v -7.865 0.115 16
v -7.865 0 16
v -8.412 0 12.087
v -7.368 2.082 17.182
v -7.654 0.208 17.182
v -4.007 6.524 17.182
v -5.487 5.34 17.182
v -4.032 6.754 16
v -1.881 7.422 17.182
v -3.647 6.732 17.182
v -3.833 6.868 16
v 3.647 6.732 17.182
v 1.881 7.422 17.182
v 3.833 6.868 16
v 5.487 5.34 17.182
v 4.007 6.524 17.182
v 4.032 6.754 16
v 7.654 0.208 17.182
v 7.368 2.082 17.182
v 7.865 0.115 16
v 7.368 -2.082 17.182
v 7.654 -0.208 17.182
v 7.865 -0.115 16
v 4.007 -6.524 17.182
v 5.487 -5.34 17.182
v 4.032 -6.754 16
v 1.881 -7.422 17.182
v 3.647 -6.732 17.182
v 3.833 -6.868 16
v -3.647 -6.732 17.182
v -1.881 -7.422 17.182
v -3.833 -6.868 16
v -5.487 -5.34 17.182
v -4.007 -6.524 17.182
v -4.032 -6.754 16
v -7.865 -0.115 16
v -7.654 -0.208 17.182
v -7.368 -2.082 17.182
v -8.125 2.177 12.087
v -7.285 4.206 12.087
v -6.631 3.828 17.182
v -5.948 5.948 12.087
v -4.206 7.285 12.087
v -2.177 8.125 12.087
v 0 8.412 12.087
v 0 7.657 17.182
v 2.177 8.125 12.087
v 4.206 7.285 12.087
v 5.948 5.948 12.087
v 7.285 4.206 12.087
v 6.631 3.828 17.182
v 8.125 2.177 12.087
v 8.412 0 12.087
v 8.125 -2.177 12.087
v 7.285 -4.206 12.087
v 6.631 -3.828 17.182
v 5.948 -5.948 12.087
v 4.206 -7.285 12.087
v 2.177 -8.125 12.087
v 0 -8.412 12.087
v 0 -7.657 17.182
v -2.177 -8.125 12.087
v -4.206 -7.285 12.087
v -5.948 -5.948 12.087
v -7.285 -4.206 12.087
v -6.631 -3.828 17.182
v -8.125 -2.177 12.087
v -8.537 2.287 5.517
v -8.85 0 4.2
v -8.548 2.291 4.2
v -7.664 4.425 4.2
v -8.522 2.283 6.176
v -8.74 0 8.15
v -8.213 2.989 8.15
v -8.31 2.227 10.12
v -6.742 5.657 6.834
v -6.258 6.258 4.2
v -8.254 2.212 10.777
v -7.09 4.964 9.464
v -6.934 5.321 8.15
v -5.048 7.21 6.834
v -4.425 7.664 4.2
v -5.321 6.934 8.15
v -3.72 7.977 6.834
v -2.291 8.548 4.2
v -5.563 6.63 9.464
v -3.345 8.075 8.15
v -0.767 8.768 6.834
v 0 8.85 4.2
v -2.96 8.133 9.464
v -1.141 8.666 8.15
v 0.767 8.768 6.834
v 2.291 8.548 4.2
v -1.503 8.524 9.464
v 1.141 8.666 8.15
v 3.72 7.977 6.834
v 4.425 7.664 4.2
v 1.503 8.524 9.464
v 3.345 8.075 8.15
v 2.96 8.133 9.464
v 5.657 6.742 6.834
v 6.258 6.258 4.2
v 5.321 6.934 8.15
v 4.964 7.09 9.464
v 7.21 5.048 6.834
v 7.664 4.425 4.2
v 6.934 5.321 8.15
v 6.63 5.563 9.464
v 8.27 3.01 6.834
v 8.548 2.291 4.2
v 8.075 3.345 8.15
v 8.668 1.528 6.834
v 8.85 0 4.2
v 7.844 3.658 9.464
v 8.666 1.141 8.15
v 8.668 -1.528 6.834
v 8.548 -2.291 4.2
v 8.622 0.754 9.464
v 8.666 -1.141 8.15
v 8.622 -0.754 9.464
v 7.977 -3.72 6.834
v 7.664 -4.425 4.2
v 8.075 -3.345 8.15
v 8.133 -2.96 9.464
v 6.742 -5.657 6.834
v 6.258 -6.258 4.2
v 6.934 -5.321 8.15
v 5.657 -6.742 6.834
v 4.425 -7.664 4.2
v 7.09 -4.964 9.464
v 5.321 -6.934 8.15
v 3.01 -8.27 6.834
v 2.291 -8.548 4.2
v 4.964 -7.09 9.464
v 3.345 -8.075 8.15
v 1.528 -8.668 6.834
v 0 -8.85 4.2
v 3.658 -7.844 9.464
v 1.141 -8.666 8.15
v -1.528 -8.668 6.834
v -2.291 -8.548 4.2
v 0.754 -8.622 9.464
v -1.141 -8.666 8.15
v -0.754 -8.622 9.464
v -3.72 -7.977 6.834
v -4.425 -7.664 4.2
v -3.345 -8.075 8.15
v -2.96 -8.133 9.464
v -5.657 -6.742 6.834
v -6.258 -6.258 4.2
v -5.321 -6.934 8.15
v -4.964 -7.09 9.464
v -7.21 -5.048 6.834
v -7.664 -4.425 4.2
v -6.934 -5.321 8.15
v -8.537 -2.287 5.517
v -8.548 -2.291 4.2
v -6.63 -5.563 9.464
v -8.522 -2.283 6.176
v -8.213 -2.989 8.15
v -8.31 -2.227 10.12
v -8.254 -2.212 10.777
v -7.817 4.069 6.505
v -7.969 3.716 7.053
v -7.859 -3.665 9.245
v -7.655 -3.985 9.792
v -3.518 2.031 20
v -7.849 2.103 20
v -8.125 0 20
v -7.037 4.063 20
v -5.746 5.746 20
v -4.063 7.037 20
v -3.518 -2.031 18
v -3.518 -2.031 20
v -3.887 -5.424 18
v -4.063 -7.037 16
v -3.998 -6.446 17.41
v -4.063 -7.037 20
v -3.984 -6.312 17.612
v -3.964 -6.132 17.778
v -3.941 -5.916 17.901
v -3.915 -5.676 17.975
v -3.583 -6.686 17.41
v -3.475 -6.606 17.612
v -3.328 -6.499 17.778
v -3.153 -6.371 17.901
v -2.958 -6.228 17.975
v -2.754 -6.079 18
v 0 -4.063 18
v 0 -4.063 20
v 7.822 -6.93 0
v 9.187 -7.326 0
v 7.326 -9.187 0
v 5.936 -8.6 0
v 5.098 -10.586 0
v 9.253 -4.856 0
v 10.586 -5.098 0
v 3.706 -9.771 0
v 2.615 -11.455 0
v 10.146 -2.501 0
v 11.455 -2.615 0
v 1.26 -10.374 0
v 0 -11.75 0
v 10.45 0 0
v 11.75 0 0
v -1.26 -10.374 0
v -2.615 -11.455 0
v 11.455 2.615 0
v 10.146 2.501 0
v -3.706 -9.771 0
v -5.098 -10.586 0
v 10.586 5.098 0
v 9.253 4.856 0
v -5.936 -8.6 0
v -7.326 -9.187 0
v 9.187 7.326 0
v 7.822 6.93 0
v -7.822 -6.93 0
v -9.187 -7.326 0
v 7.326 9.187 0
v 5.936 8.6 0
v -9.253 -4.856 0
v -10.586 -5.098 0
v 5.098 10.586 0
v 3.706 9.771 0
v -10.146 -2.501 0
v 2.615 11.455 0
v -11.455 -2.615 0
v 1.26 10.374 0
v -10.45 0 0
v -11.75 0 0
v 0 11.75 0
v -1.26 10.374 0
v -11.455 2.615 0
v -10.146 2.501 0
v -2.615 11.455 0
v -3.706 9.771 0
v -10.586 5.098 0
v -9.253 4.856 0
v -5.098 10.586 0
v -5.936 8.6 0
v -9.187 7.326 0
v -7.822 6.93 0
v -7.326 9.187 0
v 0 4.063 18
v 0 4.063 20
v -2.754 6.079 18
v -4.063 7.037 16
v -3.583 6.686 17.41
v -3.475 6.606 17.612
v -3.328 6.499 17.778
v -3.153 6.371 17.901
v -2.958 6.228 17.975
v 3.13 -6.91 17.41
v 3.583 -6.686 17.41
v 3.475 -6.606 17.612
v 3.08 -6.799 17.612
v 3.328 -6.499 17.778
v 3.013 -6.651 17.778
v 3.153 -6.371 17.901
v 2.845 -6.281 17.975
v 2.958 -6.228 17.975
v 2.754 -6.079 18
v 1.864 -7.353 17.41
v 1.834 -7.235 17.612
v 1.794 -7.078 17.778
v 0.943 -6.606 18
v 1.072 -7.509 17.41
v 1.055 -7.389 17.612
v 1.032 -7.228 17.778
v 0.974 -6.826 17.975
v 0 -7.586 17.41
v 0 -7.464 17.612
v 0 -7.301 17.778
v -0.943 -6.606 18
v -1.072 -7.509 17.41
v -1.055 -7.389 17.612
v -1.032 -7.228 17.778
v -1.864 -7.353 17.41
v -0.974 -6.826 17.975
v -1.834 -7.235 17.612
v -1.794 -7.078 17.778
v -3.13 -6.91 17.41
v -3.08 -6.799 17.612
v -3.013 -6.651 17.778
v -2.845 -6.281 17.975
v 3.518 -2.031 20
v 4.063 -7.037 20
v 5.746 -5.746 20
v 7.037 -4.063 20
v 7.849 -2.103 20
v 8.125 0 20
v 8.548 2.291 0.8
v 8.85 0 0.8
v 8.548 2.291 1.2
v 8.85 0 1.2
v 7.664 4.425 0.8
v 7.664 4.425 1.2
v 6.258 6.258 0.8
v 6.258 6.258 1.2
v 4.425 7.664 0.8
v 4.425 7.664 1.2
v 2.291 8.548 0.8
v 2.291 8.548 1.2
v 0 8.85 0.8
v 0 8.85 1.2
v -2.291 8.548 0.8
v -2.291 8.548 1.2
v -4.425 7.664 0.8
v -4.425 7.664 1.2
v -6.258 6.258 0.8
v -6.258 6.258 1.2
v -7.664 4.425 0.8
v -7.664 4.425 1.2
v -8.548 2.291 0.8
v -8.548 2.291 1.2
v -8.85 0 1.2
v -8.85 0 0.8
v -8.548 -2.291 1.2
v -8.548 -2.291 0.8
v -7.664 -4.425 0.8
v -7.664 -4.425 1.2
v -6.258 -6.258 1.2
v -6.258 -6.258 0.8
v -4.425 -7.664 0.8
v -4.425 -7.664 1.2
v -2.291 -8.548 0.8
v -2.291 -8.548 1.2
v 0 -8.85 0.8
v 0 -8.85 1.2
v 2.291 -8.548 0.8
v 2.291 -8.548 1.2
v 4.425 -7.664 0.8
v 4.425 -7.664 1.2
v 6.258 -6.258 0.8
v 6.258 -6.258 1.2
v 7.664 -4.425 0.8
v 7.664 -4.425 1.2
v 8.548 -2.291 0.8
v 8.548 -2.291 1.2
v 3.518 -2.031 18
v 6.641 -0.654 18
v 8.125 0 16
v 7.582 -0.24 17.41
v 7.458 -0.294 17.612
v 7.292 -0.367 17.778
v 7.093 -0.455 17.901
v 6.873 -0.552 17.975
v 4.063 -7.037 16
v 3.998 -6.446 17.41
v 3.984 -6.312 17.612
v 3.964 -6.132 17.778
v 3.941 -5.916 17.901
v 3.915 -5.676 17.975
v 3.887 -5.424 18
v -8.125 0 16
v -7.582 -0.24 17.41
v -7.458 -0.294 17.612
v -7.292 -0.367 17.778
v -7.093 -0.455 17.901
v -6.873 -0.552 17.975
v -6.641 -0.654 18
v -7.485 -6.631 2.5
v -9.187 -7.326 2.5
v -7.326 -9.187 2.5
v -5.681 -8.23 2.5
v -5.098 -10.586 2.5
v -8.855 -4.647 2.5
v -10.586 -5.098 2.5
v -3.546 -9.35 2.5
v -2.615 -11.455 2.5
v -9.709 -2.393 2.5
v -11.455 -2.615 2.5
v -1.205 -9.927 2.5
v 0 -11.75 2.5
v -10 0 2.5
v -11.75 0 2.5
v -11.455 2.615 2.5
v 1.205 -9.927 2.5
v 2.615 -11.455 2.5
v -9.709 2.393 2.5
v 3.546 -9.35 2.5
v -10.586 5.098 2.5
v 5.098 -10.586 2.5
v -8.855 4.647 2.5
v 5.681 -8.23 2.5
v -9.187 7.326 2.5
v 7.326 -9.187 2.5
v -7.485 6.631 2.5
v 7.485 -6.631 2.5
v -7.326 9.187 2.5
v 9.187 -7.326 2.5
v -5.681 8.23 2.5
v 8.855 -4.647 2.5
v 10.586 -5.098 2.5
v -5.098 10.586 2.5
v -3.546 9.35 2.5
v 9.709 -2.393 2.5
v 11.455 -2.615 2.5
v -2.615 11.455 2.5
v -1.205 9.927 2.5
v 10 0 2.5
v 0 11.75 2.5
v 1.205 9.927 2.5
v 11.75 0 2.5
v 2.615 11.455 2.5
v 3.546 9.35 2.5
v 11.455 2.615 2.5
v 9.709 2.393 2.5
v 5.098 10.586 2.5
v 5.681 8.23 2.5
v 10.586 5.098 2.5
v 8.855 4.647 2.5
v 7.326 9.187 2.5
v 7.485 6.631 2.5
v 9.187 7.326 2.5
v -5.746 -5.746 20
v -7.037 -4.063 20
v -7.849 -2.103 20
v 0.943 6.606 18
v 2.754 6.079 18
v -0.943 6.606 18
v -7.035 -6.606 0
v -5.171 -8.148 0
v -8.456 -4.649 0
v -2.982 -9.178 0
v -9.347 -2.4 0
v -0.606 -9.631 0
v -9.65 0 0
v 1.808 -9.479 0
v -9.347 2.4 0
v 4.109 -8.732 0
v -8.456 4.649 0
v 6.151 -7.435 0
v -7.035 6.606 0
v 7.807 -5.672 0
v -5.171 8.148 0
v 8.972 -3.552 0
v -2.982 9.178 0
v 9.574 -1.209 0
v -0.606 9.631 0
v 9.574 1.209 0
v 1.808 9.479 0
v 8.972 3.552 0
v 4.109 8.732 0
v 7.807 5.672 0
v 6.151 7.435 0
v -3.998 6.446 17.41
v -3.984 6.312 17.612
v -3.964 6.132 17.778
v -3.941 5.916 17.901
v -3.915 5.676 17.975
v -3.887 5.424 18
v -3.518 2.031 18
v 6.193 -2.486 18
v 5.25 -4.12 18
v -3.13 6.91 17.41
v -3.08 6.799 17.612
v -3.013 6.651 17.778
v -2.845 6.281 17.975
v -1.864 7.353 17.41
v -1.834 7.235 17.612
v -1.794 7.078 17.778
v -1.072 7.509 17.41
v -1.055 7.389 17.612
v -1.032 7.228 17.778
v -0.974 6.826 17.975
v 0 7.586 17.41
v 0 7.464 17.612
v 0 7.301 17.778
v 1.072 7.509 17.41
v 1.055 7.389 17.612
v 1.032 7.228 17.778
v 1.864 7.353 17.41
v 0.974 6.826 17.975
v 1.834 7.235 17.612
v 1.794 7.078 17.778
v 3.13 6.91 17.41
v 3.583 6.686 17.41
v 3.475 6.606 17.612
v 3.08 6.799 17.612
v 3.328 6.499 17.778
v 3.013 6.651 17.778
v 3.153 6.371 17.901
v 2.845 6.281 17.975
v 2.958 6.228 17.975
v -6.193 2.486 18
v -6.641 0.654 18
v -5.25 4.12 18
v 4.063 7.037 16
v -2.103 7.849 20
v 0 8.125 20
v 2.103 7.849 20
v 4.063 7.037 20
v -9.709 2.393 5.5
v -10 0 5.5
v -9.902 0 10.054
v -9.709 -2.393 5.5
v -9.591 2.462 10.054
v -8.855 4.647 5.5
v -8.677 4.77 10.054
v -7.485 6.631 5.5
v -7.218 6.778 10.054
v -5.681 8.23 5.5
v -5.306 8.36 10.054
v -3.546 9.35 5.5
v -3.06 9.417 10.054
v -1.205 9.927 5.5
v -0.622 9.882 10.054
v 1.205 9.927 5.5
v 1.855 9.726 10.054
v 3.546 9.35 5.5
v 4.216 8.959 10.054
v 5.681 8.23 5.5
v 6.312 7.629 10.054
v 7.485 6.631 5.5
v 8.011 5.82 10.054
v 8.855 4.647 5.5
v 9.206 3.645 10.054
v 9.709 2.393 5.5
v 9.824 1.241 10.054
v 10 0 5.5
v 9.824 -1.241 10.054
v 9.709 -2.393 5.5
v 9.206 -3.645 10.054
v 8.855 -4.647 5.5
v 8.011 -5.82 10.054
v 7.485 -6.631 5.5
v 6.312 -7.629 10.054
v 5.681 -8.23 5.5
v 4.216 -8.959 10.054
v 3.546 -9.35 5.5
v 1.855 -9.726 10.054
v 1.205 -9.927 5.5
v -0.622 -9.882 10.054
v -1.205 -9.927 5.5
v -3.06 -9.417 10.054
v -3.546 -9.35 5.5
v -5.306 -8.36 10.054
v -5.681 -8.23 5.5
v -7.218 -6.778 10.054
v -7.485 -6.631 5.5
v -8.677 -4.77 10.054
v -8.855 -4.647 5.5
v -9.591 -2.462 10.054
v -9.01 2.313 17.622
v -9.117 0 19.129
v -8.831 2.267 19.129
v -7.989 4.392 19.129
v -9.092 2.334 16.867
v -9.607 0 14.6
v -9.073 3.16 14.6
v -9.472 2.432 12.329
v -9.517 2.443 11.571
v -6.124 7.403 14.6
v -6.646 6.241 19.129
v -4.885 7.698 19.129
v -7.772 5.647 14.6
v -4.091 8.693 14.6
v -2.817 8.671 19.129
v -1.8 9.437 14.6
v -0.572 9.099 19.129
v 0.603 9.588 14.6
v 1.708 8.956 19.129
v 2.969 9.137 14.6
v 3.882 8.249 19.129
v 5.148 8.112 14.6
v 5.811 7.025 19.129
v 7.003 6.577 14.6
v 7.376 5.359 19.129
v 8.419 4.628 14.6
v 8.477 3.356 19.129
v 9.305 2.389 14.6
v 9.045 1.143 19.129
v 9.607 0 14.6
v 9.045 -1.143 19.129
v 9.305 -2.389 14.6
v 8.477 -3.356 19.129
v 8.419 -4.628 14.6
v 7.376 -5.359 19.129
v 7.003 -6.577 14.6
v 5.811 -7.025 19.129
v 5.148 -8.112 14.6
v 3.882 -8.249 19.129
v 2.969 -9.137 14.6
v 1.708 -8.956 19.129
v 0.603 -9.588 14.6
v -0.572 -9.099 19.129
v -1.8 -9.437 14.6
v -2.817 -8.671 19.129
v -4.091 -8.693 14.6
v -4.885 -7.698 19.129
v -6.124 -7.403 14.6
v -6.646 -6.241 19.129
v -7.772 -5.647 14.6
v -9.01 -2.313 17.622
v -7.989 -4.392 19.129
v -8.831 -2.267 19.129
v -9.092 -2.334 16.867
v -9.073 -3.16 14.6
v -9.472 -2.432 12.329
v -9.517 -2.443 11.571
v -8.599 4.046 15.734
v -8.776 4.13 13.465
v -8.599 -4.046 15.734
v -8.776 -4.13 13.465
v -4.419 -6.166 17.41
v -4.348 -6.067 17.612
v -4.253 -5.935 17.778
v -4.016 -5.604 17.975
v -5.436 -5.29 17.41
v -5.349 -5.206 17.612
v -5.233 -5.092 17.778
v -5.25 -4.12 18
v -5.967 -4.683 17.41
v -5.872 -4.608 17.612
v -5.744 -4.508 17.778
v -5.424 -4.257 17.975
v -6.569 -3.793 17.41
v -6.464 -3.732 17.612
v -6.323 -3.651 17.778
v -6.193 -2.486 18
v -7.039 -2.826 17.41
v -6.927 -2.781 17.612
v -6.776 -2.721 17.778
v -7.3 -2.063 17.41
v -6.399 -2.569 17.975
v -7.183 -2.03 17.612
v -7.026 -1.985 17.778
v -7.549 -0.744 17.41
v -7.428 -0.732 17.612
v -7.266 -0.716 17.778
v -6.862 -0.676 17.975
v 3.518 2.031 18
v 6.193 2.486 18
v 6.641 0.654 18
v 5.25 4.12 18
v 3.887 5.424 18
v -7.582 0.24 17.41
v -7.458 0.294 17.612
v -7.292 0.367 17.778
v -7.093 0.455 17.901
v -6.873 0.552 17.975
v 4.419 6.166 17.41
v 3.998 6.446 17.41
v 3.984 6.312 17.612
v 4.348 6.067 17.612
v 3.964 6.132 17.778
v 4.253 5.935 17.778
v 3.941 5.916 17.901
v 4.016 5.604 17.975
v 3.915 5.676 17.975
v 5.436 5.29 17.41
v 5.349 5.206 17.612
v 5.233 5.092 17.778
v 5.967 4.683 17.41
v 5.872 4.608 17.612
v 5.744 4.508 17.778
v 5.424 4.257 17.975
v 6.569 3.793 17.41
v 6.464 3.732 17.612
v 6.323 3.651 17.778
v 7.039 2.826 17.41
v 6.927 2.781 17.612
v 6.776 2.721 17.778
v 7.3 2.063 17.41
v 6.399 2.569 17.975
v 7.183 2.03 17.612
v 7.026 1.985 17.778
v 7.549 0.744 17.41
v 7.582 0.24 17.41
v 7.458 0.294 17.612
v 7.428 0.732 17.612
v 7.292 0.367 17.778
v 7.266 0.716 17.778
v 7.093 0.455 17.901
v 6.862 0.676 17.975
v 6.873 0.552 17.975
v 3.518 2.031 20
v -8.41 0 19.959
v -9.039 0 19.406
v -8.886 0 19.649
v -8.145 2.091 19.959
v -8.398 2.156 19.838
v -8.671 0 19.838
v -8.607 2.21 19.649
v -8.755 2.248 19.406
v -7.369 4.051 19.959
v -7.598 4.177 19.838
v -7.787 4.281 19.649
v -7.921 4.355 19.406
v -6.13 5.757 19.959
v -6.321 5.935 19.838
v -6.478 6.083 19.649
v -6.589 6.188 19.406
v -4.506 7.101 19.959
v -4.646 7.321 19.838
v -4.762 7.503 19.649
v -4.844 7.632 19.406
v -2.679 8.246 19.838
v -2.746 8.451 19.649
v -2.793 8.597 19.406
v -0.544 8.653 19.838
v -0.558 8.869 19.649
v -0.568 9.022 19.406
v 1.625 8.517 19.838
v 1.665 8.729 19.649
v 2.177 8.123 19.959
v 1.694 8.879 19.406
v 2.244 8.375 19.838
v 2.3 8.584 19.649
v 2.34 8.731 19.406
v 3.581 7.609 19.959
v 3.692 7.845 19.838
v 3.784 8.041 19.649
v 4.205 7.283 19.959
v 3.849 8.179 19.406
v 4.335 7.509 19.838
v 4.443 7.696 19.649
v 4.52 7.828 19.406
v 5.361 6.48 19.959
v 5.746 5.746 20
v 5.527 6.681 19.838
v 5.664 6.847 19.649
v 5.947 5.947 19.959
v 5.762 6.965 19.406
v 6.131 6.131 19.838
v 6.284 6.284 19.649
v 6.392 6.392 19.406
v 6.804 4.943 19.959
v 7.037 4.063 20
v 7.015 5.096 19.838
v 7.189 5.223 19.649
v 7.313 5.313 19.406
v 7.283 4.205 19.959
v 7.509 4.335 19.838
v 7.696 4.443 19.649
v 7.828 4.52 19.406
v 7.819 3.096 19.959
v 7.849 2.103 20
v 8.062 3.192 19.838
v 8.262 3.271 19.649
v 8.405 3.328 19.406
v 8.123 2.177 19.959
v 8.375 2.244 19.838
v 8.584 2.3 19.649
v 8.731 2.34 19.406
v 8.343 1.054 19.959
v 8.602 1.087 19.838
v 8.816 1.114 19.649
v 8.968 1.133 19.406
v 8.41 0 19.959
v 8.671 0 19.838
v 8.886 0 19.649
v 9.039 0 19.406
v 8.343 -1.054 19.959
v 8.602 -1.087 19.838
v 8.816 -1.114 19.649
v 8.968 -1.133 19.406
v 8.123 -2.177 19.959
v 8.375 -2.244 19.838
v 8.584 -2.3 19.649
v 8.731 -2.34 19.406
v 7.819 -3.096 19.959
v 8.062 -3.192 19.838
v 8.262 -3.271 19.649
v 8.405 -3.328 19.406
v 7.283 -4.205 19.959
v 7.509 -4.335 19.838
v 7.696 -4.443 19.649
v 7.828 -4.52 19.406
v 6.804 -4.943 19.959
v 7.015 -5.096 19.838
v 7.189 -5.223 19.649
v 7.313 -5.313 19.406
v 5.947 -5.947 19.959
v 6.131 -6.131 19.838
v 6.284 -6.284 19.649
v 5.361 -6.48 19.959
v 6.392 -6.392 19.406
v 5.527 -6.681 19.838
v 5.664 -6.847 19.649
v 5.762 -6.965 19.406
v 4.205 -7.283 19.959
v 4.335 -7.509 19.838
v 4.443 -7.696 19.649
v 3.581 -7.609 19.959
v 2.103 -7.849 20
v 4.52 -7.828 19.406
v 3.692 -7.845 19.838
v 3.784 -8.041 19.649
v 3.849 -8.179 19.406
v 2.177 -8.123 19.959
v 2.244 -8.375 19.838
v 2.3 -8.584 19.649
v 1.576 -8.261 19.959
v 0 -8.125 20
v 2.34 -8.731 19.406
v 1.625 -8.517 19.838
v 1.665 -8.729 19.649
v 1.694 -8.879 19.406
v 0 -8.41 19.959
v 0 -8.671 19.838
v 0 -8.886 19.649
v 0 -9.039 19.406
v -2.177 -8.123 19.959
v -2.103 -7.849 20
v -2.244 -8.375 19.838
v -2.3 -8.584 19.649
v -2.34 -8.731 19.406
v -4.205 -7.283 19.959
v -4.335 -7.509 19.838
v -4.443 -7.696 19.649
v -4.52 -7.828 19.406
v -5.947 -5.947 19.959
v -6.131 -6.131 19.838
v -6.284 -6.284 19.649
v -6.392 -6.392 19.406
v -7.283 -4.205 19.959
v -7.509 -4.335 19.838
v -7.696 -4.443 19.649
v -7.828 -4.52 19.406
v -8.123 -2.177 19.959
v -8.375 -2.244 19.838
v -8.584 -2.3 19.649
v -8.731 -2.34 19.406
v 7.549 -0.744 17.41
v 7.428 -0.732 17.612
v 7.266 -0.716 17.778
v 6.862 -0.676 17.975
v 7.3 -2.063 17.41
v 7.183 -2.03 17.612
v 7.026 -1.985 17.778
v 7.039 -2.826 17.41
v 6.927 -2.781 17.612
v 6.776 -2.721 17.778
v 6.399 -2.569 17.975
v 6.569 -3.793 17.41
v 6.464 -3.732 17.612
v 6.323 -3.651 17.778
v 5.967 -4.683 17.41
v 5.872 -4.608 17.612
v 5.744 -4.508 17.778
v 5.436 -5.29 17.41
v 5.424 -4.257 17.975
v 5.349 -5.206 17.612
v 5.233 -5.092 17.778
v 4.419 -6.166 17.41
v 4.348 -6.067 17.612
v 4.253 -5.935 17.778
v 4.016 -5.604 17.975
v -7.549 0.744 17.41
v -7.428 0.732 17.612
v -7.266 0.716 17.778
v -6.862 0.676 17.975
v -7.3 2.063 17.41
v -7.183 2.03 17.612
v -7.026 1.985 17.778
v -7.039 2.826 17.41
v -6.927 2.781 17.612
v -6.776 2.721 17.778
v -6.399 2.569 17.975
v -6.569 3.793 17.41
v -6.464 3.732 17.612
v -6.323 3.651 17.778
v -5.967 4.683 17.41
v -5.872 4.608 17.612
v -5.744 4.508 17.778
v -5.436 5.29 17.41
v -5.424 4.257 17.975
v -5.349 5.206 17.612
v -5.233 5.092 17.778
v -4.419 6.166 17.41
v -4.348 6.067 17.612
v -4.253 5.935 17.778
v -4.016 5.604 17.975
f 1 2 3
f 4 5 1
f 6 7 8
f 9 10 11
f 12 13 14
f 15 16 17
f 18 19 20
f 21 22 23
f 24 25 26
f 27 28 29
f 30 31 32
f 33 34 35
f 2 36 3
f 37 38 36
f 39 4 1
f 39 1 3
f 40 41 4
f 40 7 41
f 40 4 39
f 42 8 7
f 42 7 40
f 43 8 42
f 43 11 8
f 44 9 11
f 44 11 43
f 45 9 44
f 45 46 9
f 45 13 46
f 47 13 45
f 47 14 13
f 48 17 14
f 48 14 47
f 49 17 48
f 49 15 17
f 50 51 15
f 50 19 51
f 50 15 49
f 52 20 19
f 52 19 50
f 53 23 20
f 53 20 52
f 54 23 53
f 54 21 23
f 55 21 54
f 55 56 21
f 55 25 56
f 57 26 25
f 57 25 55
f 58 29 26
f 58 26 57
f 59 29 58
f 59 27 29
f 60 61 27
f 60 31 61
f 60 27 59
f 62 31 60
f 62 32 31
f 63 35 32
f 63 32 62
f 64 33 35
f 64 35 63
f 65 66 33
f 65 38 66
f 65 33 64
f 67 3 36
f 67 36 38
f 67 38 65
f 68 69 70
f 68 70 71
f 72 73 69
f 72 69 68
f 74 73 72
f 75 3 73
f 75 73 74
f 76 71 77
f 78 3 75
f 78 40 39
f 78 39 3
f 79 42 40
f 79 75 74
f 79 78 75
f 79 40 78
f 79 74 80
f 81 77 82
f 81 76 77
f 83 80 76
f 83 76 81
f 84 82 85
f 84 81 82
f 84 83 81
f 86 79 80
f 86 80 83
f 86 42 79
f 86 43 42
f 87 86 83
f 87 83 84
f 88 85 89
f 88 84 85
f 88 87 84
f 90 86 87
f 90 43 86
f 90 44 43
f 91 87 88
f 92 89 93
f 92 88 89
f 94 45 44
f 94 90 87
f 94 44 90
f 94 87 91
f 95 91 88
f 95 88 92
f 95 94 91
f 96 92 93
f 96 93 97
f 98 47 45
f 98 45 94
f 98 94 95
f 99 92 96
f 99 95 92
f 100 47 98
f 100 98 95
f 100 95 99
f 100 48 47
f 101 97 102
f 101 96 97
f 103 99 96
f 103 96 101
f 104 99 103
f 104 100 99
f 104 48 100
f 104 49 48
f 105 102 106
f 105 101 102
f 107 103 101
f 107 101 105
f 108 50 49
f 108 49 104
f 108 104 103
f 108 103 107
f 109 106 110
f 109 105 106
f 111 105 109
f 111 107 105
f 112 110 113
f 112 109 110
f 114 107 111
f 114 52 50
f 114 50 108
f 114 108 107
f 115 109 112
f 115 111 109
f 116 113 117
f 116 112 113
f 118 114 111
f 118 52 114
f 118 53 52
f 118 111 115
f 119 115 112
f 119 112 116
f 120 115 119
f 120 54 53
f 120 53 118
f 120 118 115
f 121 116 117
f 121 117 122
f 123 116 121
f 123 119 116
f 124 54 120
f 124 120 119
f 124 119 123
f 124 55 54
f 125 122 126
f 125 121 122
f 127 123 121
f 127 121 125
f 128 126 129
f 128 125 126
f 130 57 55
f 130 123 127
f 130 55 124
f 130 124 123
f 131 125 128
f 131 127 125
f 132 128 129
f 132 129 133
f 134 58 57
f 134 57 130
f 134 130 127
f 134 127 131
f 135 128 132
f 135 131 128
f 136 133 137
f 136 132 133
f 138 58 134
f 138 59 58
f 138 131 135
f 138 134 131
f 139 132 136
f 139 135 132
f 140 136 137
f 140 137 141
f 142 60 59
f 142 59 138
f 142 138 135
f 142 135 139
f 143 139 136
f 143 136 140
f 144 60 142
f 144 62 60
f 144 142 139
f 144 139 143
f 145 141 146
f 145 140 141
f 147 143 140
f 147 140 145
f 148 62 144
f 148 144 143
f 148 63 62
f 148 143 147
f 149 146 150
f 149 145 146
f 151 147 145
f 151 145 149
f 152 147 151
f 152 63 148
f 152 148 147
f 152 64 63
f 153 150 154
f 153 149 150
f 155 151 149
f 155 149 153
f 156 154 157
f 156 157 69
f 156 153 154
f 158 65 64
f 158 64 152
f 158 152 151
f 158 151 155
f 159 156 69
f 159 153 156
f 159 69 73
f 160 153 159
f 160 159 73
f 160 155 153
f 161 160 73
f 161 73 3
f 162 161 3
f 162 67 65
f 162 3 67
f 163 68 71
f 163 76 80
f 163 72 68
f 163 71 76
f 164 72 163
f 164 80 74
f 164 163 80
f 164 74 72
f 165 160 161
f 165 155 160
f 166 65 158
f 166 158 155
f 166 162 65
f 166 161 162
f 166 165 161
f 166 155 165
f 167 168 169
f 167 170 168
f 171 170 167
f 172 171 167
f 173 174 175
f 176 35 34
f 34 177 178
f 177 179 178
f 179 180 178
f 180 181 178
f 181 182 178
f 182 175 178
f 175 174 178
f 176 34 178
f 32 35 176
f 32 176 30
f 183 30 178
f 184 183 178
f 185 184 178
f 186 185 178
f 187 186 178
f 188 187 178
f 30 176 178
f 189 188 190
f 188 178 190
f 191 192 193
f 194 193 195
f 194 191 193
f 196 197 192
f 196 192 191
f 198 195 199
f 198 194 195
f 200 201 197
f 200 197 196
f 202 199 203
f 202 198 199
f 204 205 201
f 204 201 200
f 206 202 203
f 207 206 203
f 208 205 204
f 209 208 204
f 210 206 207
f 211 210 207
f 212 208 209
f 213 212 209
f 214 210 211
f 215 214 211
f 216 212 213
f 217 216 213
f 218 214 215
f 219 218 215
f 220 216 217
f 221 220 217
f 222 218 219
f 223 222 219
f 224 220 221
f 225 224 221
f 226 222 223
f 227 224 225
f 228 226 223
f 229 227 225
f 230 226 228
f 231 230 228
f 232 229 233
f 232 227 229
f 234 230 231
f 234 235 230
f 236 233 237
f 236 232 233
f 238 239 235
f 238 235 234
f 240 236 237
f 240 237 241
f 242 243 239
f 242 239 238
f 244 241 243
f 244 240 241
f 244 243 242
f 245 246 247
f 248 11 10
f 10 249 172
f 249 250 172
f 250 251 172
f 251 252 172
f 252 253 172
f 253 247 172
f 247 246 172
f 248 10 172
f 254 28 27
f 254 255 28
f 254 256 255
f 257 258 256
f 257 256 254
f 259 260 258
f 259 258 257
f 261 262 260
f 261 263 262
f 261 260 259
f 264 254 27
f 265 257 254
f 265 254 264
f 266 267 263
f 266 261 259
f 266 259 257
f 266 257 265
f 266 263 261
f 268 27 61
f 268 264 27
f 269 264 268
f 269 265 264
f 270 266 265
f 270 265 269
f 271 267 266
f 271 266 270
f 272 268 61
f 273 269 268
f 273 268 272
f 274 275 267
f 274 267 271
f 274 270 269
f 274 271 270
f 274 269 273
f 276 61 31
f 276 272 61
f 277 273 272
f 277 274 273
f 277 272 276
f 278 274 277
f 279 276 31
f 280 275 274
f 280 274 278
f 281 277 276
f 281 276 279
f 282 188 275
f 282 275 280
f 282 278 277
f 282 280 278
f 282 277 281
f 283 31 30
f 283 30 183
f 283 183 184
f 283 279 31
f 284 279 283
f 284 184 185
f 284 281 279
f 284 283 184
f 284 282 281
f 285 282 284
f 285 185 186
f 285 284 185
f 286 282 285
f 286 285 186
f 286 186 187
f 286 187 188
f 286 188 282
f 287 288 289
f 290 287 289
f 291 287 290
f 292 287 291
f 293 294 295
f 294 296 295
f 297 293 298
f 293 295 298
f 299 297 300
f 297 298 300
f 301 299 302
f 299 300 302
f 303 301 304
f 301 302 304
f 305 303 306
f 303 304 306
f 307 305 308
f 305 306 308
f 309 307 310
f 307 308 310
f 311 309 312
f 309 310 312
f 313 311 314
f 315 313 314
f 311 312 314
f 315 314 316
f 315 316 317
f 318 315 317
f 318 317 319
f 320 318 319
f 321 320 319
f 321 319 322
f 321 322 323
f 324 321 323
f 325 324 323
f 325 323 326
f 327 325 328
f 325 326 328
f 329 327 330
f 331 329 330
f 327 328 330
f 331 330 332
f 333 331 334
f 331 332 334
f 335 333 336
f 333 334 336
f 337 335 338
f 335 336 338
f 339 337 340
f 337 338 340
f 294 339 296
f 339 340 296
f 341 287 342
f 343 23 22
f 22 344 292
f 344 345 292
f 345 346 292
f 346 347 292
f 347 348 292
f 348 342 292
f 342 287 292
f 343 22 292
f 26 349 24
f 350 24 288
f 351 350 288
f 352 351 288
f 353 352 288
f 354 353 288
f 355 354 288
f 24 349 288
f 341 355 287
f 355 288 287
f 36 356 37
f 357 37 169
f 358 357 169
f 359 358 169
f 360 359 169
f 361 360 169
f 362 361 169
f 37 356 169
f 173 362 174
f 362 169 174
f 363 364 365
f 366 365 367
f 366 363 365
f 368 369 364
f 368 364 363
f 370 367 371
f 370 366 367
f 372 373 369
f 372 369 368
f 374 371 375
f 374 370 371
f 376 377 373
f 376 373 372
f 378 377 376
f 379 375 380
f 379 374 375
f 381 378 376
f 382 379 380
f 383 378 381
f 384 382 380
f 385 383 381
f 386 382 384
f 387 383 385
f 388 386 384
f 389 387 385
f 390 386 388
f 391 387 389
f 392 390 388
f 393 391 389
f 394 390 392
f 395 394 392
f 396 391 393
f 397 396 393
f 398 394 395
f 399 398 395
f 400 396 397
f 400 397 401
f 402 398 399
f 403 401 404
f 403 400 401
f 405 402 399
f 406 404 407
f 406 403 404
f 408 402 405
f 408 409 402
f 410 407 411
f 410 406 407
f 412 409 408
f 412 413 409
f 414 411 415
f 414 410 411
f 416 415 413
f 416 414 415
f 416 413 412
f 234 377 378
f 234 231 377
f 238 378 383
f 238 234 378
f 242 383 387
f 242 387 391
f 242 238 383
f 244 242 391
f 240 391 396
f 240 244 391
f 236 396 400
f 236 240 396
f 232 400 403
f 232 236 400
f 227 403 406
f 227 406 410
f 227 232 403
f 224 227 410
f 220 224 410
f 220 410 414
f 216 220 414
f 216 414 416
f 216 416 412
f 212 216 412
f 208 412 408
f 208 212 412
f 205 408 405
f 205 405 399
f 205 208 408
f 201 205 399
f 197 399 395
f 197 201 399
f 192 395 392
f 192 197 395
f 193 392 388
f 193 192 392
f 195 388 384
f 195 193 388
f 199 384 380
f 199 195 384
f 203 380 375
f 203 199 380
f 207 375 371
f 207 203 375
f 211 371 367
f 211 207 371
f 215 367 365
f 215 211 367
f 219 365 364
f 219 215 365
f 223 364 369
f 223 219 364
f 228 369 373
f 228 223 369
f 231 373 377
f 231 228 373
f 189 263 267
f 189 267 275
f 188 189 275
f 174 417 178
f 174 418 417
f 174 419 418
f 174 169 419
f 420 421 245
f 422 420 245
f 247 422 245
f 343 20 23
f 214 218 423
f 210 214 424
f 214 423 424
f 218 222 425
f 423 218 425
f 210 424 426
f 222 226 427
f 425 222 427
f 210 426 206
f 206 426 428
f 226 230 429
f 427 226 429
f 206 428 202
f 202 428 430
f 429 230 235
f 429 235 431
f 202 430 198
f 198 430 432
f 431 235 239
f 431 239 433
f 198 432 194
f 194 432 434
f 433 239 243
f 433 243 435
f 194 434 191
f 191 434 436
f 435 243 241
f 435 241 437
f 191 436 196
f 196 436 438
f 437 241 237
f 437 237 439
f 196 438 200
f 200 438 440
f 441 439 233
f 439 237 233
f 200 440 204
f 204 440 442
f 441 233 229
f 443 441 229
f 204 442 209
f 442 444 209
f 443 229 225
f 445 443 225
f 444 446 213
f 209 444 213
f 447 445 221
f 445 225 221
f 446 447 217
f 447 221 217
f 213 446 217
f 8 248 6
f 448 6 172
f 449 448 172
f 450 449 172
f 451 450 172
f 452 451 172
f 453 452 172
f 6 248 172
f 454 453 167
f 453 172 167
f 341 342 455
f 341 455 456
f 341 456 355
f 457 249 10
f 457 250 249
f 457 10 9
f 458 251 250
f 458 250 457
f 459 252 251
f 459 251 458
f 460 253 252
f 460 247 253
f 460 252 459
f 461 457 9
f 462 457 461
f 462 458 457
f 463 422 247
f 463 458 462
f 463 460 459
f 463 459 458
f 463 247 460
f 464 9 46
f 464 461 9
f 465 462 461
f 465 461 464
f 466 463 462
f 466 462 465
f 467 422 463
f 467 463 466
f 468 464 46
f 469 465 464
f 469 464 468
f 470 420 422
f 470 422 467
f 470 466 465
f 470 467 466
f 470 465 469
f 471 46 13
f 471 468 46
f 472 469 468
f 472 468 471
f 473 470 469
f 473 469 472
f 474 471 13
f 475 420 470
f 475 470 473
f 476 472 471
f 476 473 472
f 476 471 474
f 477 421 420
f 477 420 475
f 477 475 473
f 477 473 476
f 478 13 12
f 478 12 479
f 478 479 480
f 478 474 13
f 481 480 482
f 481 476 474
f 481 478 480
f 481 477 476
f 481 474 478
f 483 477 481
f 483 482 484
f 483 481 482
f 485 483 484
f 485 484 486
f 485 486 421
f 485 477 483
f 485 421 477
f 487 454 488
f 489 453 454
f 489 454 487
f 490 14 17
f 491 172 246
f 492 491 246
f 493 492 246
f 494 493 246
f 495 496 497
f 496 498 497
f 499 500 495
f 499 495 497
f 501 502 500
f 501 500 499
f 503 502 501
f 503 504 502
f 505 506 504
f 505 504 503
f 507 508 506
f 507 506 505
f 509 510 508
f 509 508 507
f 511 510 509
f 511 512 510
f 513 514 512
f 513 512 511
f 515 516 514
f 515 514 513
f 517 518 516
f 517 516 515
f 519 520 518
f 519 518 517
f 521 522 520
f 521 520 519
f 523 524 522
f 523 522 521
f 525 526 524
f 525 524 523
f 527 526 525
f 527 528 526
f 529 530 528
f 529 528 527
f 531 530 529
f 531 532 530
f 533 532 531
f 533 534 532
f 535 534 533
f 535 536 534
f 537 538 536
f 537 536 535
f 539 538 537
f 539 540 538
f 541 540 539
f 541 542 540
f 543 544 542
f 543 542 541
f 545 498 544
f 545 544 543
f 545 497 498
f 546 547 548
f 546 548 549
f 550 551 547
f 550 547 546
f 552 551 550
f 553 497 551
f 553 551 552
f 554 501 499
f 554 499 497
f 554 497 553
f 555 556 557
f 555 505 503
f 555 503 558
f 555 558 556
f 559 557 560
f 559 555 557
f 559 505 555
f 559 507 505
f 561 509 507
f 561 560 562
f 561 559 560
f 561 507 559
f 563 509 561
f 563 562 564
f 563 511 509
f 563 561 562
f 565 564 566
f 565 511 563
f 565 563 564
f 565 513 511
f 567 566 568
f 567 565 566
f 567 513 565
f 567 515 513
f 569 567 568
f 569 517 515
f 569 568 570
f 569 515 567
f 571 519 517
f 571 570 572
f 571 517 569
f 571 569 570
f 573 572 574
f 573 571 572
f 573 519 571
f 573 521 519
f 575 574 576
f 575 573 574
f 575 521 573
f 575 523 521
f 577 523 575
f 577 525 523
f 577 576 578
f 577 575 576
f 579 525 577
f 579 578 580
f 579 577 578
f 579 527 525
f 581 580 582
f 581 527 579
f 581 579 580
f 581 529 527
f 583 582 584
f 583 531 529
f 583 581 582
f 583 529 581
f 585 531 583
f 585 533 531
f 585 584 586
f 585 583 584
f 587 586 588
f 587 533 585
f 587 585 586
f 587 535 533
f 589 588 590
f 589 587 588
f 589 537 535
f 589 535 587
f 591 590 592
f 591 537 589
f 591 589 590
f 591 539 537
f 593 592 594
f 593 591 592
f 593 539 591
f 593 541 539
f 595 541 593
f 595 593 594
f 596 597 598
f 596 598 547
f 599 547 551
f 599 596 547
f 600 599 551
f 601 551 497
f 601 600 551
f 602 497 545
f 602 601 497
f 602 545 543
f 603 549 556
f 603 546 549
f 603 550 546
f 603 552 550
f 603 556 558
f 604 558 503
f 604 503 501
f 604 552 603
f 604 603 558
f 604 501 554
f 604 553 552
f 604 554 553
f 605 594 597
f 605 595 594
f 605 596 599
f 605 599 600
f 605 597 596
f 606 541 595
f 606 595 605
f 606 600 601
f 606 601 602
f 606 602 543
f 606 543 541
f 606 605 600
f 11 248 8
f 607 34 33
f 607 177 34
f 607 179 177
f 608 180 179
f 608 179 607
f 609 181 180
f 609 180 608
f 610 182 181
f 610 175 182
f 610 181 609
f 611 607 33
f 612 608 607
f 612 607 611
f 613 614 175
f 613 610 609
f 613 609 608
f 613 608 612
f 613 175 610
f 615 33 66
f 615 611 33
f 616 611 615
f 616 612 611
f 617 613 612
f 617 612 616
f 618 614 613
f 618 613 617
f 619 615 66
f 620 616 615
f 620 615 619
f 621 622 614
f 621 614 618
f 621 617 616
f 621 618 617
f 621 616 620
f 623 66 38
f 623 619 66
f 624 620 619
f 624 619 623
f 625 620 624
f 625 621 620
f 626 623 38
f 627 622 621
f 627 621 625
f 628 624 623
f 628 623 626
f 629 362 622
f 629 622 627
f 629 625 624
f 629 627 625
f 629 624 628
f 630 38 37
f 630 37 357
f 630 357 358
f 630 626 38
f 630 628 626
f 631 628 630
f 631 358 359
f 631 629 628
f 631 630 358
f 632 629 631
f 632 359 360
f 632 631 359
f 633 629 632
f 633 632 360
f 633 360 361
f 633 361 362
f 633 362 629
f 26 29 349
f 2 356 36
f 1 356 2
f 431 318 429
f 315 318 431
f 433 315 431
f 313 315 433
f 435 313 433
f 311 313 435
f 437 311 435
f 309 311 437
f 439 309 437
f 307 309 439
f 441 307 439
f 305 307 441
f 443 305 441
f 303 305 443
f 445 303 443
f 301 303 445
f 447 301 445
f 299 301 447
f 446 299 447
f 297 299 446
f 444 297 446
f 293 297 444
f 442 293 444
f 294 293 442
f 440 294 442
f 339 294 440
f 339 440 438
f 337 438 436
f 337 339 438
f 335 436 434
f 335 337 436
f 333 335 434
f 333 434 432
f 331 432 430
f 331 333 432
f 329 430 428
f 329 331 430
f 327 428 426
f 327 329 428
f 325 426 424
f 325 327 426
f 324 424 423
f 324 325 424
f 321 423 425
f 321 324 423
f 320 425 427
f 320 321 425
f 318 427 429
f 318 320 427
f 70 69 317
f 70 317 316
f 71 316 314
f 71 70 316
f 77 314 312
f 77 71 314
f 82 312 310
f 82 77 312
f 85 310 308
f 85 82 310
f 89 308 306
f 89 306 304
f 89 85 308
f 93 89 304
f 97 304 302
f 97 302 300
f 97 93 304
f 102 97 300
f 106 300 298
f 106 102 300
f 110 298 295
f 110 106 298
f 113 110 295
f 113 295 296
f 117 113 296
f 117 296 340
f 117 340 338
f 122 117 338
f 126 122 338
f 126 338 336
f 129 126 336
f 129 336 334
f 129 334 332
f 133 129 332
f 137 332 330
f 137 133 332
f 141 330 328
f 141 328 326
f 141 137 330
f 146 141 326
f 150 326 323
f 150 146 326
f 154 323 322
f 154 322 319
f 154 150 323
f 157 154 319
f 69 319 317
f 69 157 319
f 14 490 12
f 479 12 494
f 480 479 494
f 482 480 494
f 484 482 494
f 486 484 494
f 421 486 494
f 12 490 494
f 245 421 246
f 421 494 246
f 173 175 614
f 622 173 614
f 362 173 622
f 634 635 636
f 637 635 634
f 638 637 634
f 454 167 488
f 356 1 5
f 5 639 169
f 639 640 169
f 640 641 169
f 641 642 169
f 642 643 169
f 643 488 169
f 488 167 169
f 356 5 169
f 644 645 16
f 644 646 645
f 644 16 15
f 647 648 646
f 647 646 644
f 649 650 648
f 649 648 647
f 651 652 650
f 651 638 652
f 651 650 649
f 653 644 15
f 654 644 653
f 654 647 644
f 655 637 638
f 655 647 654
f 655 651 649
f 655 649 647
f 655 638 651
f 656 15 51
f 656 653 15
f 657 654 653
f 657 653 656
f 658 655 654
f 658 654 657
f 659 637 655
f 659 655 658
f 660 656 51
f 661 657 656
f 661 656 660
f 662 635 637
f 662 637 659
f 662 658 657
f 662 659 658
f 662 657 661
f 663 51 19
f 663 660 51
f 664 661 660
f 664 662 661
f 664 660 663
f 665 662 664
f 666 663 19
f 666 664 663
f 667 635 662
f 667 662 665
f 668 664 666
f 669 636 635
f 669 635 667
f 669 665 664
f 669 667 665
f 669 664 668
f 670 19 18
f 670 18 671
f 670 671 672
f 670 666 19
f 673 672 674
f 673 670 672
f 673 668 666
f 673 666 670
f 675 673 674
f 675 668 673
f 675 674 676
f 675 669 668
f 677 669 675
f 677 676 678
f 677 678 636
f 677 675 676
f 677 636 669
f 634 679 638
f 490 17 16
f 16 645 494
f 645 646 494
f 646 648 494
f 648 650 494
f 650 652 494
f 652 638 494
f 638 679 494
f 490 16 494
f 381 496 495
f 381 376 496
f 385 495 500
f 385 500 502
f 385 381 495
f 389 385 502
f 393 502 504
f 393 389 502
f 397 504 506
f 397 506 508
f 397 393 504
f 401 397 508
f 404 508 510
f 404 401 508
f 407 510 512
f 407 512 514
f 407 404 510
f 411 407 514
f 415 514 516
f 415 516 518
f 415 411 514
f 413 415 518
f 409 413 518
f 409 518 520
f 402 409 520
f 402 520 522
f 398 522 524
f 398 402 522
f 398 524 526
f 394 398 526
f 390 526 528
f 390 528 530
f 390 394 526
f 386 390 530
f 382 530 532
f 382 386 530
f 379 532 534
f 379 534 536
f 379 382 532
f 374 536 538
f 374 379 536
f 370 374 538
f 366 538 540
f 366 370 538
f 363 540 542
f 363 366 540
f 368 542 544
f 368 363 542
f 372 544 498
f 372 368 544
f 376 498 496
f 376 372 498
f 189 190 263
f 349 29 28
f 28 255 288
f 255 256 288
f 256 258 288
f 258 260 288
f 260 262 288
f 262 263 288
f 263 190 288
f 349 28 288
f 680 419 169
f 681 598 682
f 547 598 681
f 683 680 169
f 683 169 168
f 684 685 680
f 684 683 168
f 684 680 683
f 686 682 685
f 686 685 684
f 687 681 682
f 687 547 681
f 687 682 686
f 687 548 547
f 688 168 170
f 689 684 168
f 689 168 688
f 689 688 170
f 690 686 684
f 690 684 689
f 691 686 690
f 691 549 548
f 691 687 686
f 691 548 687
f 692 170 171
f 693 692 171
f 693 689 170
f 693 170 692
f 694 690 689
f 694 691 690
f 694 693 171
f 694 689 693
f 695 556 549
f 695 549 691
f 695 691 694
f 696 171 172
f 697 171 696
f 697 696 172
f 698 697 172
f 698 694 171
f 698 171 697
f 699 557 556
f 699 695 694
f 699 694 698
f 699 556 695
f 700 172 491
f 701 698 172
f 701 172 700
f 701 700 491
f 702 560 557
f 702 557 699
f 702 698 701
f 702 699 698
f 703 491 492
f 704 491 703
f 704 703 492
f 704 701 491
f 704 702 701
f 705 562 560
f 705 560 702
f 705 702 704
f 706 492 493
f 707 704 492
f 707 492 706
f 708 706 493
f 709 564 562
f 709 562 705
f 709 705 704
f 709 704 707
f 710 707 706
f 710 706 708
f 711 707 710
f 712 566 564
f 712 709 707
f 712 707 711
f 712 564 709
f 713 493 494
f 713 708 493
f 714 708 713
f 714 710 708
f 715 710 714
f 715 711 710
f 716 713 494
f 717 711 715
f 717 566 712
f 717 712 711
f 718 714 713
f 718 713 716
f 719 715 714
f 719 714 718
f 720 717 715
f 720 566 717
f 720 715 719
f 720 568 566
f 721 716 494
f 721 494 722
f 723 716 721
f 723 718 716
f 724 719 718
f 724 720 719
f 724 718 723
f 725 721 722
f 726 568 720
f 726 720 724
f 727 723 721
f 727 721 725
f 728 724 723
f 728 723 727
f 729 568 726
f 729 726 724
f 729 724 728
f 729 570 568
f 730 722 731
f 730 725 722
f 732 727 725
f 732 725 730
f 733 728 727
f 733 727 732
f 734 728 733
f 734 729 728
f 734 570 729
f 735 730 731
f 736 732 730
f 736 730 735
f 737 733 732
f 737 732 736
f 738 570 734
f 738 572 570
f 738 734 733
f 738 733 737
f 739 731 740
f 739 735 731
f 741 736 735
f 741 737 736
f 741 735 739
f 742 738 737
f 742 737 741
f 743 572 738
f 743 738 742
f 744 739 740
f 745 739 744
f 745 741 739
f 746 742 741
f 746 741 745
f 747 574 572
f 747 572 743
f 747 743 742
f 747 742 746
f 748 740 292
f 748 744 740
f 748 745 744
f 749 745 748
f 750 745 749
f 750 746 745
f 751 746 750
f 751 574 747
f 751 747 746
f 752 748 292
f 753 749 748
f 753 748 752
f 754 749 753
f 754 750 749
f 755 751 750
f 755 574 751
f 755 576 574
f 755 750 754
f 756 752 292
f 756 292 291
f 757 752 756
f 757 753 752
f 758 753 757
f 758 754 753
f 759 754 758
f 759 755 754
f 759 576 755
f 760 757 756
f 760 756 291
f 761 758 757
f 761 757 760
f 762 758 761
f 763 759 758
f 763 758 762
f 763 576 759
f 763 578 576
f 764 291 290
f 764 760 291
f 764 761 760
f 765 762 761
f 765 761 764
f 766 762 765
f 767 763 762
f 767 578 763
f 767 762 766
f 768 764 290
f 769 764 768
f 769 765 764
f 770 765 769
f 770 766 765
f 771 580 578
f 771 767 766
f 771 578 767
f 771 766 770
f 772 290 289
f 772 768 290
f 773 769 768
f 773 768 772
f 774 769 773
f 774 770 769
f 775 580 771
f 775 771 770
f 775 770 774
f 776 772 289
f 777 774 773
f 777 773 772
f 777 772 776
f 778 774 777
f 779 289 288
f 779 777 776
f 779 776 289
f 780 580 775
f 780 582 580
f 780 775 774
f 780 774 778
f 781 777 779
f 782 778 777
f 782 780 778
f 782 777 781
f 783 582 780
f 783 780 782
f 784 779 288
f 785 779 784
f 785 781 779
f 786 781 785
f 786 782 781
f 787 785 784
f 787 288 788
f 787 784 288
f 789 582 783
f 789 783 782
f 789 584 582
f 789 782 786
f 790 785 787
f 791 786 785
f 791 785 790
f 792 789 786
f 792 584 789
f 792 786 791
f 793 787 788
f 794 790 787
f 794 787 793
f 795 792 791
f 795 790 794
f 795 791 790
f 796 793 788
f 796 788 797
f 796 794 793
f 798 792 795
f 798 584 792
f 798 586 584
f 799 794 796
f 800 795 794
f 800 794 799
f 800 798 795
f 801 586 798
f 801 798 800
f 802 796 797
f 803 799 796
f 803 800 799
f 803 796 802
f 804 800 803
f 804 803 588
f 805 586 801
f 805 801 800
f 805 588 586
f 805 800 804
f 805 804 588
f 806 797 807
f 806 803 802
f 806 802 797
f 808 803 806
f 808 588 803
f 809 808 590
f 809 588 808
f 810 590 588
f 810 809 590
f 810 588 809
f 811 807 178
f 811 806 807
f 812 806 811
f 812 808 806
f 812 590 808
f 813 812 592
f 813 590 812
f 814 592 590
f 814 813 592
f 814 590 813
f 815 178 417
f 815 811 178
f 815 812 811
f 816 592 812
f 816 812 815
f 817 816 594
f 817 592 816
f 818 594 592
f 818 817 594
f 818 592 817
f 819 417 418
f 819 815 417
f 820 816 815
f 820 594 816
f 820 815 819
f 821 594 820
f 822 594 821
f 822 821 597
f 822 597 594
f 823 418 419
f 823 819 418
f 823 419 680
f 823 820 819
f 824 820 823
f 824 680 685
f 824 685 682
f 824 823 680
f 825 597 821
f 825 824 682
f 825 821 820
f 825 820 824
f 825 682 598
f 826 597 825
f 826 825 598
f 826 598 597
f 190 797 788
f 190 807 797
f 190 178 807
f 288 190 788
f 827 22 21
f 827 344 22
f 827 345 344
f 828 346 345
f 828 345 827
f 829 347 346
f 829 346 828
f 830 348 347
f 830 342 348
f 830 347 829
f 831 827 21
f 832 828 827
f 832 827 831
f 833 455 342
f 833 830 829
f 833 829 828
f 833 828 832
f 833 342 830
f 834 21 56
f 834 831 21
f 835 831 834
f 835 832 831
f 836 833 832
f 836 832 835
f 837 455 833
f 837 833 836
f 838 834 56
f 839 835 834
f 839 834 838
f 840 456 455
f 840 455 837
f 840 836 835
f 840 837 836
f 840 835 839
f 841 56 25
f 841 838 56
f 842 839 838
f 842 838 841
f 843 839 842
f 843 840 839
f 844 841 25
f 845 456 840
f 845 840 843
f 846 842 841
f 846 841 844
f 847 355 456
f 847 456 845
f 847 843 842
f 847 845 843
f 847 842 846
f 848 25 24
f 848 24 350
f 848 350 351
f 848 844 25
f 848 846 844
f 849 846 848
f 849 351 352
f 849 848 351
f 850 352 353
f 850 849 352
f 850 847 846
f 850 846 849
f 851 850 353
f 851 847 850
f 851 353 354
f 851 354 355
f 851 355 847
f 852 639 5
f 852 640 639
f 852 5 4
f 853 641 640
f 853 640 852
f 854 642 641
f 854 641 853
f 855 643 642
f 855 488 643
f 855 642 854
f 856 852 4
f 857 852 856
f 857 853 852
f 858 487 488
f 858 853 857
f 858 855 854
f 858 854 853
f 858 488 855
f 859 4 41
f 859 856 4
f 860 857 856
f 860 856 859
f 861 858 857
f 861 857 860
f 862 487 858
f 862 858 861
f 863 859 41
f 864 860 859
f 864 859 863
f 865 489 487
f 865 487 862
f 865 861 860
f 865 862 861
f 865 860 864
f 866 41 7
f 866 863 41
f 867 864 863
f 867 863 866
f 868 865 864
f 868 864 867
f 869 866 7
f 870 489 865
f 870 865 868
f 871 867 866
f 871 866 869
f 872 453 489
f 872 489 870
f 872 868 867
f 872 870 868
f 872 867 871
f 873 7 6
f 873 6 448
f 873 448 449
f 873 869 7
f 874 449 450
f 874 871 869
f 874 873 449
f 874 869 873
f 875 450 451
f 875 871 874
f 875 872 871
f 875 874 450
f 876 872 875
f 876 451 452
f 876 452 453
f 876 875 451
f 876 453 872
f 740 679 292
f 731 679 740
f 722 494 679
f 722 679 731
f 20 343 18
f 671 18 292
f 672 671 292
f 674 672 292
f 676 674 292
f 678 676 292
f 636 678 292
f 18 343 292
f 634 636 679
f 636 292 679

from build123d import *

# Parameters (mm, degrees)
F3_DEPTH    = 4
F4_S6_R     = 8.85
F4_T7_DEPTH = 16


# Not quite as in the source:
# - a fillet or chamfer that OpenCascade refuses, or shapes differently, is made with other operations: its cross-section is extruded or revolved along the edge and cut away or added


with BuildPart() as f1:
    # F0 (on Front) → F1 (revolve)
    with BuildSketch(Plane.XZ):
        with BuildLine():
            Line((-11.75, 2.5), (-11.75, 0))
            Line((-11.75, 0), (-10.45, 0))
            Line((-10.45, 0), (-10.45, 1.2))
            Line((-10.45, 1.2), (-8.85, 1.2))
            Line((-8.85, 1.2), (-8.85, 4.2))
            ThreePointArc((-8.85, 4.2), (-8.5510140246, 10.7185269337), (-7.6565668329, 17.1823145401))
            ThreePointArc((-7.6565668329, 17.1823145401), (-7.3127346822, 17.7688675244), (-6.6733265732, 18))
            Line((-6.6733265732, 18), (0, 18))
            Line((0, 18), (0, 20))
            Line((0, 20), (-8.1253765053, 20))
            ThreePointArc((-8.1253765053, 20), (-8.7852885229, 19.7513428838), (-9.117016902, 19.1290322581))
            ThreePointArc((-9.117016902, 19.1290322581), (-9.7790230738, 12.3288025935), (-10, 5.5))
            Line((-10, 5.5), (-10, 2.5))
            Line((-10, 2.5), (-11.75, 2.5))
        make_face()
    revolve(axis=Axis((0, 0, 19), (0, 0, -1)))

    # F2 (on face) → F3 (cut)
    with BuildSketch(Plane.XY.offset(20)):
        Polygon((4.0626882527, 7.0367824689), (0, 4.0626882527), (-4.0626882527, 7.0367824689), (-3.5183912345, 2.0313441263), (-8.1253765053, 0), (-3.5183912345, -2.0313441263), (-4.0626882527, -7.0367824689), (0, -4.0626882527), (4.0626882527, -7.0367824689), (3.5183912345, -2.0313441263), (8.1253765053, 0), (3.5183912345, 2.0313441263), align=None)
    extrude(amount=-F3_DEPTH, mode=Mode.SUBTRACT)

    # F4: chamfer of 2 on 1 edges, made by hand


with BuildPart() as f4_tool2:
    # F4_s3 → F4_t4 (revolve)
    with BuildSketch(Plane.XZ):
        Polygon((-10.45, -0.8), (-8.45, 1.2), (-10.45, 1.2), align=None)
    revolve(axis=Axis((0, 0, 1.2), (0, 0, -1)))

    split(bisect_by=Plane.XY, keep=Keep.TOP)

    # F4_s6 → F4_t7 (cut, symmetric)
    with BuildSketch(Plane.XY.offset(0.2)):
        Circle(F4_S6_R)
    extrude(amount=F4_T7_DEPTH, both=True, mode=Mode.SUBTRACT)


with BuildPart() as f1_1:
    add(f1.part)

    # F4_t1: union F4_tool2
    add(f4_tool2.part)


solid = f1_1.part
